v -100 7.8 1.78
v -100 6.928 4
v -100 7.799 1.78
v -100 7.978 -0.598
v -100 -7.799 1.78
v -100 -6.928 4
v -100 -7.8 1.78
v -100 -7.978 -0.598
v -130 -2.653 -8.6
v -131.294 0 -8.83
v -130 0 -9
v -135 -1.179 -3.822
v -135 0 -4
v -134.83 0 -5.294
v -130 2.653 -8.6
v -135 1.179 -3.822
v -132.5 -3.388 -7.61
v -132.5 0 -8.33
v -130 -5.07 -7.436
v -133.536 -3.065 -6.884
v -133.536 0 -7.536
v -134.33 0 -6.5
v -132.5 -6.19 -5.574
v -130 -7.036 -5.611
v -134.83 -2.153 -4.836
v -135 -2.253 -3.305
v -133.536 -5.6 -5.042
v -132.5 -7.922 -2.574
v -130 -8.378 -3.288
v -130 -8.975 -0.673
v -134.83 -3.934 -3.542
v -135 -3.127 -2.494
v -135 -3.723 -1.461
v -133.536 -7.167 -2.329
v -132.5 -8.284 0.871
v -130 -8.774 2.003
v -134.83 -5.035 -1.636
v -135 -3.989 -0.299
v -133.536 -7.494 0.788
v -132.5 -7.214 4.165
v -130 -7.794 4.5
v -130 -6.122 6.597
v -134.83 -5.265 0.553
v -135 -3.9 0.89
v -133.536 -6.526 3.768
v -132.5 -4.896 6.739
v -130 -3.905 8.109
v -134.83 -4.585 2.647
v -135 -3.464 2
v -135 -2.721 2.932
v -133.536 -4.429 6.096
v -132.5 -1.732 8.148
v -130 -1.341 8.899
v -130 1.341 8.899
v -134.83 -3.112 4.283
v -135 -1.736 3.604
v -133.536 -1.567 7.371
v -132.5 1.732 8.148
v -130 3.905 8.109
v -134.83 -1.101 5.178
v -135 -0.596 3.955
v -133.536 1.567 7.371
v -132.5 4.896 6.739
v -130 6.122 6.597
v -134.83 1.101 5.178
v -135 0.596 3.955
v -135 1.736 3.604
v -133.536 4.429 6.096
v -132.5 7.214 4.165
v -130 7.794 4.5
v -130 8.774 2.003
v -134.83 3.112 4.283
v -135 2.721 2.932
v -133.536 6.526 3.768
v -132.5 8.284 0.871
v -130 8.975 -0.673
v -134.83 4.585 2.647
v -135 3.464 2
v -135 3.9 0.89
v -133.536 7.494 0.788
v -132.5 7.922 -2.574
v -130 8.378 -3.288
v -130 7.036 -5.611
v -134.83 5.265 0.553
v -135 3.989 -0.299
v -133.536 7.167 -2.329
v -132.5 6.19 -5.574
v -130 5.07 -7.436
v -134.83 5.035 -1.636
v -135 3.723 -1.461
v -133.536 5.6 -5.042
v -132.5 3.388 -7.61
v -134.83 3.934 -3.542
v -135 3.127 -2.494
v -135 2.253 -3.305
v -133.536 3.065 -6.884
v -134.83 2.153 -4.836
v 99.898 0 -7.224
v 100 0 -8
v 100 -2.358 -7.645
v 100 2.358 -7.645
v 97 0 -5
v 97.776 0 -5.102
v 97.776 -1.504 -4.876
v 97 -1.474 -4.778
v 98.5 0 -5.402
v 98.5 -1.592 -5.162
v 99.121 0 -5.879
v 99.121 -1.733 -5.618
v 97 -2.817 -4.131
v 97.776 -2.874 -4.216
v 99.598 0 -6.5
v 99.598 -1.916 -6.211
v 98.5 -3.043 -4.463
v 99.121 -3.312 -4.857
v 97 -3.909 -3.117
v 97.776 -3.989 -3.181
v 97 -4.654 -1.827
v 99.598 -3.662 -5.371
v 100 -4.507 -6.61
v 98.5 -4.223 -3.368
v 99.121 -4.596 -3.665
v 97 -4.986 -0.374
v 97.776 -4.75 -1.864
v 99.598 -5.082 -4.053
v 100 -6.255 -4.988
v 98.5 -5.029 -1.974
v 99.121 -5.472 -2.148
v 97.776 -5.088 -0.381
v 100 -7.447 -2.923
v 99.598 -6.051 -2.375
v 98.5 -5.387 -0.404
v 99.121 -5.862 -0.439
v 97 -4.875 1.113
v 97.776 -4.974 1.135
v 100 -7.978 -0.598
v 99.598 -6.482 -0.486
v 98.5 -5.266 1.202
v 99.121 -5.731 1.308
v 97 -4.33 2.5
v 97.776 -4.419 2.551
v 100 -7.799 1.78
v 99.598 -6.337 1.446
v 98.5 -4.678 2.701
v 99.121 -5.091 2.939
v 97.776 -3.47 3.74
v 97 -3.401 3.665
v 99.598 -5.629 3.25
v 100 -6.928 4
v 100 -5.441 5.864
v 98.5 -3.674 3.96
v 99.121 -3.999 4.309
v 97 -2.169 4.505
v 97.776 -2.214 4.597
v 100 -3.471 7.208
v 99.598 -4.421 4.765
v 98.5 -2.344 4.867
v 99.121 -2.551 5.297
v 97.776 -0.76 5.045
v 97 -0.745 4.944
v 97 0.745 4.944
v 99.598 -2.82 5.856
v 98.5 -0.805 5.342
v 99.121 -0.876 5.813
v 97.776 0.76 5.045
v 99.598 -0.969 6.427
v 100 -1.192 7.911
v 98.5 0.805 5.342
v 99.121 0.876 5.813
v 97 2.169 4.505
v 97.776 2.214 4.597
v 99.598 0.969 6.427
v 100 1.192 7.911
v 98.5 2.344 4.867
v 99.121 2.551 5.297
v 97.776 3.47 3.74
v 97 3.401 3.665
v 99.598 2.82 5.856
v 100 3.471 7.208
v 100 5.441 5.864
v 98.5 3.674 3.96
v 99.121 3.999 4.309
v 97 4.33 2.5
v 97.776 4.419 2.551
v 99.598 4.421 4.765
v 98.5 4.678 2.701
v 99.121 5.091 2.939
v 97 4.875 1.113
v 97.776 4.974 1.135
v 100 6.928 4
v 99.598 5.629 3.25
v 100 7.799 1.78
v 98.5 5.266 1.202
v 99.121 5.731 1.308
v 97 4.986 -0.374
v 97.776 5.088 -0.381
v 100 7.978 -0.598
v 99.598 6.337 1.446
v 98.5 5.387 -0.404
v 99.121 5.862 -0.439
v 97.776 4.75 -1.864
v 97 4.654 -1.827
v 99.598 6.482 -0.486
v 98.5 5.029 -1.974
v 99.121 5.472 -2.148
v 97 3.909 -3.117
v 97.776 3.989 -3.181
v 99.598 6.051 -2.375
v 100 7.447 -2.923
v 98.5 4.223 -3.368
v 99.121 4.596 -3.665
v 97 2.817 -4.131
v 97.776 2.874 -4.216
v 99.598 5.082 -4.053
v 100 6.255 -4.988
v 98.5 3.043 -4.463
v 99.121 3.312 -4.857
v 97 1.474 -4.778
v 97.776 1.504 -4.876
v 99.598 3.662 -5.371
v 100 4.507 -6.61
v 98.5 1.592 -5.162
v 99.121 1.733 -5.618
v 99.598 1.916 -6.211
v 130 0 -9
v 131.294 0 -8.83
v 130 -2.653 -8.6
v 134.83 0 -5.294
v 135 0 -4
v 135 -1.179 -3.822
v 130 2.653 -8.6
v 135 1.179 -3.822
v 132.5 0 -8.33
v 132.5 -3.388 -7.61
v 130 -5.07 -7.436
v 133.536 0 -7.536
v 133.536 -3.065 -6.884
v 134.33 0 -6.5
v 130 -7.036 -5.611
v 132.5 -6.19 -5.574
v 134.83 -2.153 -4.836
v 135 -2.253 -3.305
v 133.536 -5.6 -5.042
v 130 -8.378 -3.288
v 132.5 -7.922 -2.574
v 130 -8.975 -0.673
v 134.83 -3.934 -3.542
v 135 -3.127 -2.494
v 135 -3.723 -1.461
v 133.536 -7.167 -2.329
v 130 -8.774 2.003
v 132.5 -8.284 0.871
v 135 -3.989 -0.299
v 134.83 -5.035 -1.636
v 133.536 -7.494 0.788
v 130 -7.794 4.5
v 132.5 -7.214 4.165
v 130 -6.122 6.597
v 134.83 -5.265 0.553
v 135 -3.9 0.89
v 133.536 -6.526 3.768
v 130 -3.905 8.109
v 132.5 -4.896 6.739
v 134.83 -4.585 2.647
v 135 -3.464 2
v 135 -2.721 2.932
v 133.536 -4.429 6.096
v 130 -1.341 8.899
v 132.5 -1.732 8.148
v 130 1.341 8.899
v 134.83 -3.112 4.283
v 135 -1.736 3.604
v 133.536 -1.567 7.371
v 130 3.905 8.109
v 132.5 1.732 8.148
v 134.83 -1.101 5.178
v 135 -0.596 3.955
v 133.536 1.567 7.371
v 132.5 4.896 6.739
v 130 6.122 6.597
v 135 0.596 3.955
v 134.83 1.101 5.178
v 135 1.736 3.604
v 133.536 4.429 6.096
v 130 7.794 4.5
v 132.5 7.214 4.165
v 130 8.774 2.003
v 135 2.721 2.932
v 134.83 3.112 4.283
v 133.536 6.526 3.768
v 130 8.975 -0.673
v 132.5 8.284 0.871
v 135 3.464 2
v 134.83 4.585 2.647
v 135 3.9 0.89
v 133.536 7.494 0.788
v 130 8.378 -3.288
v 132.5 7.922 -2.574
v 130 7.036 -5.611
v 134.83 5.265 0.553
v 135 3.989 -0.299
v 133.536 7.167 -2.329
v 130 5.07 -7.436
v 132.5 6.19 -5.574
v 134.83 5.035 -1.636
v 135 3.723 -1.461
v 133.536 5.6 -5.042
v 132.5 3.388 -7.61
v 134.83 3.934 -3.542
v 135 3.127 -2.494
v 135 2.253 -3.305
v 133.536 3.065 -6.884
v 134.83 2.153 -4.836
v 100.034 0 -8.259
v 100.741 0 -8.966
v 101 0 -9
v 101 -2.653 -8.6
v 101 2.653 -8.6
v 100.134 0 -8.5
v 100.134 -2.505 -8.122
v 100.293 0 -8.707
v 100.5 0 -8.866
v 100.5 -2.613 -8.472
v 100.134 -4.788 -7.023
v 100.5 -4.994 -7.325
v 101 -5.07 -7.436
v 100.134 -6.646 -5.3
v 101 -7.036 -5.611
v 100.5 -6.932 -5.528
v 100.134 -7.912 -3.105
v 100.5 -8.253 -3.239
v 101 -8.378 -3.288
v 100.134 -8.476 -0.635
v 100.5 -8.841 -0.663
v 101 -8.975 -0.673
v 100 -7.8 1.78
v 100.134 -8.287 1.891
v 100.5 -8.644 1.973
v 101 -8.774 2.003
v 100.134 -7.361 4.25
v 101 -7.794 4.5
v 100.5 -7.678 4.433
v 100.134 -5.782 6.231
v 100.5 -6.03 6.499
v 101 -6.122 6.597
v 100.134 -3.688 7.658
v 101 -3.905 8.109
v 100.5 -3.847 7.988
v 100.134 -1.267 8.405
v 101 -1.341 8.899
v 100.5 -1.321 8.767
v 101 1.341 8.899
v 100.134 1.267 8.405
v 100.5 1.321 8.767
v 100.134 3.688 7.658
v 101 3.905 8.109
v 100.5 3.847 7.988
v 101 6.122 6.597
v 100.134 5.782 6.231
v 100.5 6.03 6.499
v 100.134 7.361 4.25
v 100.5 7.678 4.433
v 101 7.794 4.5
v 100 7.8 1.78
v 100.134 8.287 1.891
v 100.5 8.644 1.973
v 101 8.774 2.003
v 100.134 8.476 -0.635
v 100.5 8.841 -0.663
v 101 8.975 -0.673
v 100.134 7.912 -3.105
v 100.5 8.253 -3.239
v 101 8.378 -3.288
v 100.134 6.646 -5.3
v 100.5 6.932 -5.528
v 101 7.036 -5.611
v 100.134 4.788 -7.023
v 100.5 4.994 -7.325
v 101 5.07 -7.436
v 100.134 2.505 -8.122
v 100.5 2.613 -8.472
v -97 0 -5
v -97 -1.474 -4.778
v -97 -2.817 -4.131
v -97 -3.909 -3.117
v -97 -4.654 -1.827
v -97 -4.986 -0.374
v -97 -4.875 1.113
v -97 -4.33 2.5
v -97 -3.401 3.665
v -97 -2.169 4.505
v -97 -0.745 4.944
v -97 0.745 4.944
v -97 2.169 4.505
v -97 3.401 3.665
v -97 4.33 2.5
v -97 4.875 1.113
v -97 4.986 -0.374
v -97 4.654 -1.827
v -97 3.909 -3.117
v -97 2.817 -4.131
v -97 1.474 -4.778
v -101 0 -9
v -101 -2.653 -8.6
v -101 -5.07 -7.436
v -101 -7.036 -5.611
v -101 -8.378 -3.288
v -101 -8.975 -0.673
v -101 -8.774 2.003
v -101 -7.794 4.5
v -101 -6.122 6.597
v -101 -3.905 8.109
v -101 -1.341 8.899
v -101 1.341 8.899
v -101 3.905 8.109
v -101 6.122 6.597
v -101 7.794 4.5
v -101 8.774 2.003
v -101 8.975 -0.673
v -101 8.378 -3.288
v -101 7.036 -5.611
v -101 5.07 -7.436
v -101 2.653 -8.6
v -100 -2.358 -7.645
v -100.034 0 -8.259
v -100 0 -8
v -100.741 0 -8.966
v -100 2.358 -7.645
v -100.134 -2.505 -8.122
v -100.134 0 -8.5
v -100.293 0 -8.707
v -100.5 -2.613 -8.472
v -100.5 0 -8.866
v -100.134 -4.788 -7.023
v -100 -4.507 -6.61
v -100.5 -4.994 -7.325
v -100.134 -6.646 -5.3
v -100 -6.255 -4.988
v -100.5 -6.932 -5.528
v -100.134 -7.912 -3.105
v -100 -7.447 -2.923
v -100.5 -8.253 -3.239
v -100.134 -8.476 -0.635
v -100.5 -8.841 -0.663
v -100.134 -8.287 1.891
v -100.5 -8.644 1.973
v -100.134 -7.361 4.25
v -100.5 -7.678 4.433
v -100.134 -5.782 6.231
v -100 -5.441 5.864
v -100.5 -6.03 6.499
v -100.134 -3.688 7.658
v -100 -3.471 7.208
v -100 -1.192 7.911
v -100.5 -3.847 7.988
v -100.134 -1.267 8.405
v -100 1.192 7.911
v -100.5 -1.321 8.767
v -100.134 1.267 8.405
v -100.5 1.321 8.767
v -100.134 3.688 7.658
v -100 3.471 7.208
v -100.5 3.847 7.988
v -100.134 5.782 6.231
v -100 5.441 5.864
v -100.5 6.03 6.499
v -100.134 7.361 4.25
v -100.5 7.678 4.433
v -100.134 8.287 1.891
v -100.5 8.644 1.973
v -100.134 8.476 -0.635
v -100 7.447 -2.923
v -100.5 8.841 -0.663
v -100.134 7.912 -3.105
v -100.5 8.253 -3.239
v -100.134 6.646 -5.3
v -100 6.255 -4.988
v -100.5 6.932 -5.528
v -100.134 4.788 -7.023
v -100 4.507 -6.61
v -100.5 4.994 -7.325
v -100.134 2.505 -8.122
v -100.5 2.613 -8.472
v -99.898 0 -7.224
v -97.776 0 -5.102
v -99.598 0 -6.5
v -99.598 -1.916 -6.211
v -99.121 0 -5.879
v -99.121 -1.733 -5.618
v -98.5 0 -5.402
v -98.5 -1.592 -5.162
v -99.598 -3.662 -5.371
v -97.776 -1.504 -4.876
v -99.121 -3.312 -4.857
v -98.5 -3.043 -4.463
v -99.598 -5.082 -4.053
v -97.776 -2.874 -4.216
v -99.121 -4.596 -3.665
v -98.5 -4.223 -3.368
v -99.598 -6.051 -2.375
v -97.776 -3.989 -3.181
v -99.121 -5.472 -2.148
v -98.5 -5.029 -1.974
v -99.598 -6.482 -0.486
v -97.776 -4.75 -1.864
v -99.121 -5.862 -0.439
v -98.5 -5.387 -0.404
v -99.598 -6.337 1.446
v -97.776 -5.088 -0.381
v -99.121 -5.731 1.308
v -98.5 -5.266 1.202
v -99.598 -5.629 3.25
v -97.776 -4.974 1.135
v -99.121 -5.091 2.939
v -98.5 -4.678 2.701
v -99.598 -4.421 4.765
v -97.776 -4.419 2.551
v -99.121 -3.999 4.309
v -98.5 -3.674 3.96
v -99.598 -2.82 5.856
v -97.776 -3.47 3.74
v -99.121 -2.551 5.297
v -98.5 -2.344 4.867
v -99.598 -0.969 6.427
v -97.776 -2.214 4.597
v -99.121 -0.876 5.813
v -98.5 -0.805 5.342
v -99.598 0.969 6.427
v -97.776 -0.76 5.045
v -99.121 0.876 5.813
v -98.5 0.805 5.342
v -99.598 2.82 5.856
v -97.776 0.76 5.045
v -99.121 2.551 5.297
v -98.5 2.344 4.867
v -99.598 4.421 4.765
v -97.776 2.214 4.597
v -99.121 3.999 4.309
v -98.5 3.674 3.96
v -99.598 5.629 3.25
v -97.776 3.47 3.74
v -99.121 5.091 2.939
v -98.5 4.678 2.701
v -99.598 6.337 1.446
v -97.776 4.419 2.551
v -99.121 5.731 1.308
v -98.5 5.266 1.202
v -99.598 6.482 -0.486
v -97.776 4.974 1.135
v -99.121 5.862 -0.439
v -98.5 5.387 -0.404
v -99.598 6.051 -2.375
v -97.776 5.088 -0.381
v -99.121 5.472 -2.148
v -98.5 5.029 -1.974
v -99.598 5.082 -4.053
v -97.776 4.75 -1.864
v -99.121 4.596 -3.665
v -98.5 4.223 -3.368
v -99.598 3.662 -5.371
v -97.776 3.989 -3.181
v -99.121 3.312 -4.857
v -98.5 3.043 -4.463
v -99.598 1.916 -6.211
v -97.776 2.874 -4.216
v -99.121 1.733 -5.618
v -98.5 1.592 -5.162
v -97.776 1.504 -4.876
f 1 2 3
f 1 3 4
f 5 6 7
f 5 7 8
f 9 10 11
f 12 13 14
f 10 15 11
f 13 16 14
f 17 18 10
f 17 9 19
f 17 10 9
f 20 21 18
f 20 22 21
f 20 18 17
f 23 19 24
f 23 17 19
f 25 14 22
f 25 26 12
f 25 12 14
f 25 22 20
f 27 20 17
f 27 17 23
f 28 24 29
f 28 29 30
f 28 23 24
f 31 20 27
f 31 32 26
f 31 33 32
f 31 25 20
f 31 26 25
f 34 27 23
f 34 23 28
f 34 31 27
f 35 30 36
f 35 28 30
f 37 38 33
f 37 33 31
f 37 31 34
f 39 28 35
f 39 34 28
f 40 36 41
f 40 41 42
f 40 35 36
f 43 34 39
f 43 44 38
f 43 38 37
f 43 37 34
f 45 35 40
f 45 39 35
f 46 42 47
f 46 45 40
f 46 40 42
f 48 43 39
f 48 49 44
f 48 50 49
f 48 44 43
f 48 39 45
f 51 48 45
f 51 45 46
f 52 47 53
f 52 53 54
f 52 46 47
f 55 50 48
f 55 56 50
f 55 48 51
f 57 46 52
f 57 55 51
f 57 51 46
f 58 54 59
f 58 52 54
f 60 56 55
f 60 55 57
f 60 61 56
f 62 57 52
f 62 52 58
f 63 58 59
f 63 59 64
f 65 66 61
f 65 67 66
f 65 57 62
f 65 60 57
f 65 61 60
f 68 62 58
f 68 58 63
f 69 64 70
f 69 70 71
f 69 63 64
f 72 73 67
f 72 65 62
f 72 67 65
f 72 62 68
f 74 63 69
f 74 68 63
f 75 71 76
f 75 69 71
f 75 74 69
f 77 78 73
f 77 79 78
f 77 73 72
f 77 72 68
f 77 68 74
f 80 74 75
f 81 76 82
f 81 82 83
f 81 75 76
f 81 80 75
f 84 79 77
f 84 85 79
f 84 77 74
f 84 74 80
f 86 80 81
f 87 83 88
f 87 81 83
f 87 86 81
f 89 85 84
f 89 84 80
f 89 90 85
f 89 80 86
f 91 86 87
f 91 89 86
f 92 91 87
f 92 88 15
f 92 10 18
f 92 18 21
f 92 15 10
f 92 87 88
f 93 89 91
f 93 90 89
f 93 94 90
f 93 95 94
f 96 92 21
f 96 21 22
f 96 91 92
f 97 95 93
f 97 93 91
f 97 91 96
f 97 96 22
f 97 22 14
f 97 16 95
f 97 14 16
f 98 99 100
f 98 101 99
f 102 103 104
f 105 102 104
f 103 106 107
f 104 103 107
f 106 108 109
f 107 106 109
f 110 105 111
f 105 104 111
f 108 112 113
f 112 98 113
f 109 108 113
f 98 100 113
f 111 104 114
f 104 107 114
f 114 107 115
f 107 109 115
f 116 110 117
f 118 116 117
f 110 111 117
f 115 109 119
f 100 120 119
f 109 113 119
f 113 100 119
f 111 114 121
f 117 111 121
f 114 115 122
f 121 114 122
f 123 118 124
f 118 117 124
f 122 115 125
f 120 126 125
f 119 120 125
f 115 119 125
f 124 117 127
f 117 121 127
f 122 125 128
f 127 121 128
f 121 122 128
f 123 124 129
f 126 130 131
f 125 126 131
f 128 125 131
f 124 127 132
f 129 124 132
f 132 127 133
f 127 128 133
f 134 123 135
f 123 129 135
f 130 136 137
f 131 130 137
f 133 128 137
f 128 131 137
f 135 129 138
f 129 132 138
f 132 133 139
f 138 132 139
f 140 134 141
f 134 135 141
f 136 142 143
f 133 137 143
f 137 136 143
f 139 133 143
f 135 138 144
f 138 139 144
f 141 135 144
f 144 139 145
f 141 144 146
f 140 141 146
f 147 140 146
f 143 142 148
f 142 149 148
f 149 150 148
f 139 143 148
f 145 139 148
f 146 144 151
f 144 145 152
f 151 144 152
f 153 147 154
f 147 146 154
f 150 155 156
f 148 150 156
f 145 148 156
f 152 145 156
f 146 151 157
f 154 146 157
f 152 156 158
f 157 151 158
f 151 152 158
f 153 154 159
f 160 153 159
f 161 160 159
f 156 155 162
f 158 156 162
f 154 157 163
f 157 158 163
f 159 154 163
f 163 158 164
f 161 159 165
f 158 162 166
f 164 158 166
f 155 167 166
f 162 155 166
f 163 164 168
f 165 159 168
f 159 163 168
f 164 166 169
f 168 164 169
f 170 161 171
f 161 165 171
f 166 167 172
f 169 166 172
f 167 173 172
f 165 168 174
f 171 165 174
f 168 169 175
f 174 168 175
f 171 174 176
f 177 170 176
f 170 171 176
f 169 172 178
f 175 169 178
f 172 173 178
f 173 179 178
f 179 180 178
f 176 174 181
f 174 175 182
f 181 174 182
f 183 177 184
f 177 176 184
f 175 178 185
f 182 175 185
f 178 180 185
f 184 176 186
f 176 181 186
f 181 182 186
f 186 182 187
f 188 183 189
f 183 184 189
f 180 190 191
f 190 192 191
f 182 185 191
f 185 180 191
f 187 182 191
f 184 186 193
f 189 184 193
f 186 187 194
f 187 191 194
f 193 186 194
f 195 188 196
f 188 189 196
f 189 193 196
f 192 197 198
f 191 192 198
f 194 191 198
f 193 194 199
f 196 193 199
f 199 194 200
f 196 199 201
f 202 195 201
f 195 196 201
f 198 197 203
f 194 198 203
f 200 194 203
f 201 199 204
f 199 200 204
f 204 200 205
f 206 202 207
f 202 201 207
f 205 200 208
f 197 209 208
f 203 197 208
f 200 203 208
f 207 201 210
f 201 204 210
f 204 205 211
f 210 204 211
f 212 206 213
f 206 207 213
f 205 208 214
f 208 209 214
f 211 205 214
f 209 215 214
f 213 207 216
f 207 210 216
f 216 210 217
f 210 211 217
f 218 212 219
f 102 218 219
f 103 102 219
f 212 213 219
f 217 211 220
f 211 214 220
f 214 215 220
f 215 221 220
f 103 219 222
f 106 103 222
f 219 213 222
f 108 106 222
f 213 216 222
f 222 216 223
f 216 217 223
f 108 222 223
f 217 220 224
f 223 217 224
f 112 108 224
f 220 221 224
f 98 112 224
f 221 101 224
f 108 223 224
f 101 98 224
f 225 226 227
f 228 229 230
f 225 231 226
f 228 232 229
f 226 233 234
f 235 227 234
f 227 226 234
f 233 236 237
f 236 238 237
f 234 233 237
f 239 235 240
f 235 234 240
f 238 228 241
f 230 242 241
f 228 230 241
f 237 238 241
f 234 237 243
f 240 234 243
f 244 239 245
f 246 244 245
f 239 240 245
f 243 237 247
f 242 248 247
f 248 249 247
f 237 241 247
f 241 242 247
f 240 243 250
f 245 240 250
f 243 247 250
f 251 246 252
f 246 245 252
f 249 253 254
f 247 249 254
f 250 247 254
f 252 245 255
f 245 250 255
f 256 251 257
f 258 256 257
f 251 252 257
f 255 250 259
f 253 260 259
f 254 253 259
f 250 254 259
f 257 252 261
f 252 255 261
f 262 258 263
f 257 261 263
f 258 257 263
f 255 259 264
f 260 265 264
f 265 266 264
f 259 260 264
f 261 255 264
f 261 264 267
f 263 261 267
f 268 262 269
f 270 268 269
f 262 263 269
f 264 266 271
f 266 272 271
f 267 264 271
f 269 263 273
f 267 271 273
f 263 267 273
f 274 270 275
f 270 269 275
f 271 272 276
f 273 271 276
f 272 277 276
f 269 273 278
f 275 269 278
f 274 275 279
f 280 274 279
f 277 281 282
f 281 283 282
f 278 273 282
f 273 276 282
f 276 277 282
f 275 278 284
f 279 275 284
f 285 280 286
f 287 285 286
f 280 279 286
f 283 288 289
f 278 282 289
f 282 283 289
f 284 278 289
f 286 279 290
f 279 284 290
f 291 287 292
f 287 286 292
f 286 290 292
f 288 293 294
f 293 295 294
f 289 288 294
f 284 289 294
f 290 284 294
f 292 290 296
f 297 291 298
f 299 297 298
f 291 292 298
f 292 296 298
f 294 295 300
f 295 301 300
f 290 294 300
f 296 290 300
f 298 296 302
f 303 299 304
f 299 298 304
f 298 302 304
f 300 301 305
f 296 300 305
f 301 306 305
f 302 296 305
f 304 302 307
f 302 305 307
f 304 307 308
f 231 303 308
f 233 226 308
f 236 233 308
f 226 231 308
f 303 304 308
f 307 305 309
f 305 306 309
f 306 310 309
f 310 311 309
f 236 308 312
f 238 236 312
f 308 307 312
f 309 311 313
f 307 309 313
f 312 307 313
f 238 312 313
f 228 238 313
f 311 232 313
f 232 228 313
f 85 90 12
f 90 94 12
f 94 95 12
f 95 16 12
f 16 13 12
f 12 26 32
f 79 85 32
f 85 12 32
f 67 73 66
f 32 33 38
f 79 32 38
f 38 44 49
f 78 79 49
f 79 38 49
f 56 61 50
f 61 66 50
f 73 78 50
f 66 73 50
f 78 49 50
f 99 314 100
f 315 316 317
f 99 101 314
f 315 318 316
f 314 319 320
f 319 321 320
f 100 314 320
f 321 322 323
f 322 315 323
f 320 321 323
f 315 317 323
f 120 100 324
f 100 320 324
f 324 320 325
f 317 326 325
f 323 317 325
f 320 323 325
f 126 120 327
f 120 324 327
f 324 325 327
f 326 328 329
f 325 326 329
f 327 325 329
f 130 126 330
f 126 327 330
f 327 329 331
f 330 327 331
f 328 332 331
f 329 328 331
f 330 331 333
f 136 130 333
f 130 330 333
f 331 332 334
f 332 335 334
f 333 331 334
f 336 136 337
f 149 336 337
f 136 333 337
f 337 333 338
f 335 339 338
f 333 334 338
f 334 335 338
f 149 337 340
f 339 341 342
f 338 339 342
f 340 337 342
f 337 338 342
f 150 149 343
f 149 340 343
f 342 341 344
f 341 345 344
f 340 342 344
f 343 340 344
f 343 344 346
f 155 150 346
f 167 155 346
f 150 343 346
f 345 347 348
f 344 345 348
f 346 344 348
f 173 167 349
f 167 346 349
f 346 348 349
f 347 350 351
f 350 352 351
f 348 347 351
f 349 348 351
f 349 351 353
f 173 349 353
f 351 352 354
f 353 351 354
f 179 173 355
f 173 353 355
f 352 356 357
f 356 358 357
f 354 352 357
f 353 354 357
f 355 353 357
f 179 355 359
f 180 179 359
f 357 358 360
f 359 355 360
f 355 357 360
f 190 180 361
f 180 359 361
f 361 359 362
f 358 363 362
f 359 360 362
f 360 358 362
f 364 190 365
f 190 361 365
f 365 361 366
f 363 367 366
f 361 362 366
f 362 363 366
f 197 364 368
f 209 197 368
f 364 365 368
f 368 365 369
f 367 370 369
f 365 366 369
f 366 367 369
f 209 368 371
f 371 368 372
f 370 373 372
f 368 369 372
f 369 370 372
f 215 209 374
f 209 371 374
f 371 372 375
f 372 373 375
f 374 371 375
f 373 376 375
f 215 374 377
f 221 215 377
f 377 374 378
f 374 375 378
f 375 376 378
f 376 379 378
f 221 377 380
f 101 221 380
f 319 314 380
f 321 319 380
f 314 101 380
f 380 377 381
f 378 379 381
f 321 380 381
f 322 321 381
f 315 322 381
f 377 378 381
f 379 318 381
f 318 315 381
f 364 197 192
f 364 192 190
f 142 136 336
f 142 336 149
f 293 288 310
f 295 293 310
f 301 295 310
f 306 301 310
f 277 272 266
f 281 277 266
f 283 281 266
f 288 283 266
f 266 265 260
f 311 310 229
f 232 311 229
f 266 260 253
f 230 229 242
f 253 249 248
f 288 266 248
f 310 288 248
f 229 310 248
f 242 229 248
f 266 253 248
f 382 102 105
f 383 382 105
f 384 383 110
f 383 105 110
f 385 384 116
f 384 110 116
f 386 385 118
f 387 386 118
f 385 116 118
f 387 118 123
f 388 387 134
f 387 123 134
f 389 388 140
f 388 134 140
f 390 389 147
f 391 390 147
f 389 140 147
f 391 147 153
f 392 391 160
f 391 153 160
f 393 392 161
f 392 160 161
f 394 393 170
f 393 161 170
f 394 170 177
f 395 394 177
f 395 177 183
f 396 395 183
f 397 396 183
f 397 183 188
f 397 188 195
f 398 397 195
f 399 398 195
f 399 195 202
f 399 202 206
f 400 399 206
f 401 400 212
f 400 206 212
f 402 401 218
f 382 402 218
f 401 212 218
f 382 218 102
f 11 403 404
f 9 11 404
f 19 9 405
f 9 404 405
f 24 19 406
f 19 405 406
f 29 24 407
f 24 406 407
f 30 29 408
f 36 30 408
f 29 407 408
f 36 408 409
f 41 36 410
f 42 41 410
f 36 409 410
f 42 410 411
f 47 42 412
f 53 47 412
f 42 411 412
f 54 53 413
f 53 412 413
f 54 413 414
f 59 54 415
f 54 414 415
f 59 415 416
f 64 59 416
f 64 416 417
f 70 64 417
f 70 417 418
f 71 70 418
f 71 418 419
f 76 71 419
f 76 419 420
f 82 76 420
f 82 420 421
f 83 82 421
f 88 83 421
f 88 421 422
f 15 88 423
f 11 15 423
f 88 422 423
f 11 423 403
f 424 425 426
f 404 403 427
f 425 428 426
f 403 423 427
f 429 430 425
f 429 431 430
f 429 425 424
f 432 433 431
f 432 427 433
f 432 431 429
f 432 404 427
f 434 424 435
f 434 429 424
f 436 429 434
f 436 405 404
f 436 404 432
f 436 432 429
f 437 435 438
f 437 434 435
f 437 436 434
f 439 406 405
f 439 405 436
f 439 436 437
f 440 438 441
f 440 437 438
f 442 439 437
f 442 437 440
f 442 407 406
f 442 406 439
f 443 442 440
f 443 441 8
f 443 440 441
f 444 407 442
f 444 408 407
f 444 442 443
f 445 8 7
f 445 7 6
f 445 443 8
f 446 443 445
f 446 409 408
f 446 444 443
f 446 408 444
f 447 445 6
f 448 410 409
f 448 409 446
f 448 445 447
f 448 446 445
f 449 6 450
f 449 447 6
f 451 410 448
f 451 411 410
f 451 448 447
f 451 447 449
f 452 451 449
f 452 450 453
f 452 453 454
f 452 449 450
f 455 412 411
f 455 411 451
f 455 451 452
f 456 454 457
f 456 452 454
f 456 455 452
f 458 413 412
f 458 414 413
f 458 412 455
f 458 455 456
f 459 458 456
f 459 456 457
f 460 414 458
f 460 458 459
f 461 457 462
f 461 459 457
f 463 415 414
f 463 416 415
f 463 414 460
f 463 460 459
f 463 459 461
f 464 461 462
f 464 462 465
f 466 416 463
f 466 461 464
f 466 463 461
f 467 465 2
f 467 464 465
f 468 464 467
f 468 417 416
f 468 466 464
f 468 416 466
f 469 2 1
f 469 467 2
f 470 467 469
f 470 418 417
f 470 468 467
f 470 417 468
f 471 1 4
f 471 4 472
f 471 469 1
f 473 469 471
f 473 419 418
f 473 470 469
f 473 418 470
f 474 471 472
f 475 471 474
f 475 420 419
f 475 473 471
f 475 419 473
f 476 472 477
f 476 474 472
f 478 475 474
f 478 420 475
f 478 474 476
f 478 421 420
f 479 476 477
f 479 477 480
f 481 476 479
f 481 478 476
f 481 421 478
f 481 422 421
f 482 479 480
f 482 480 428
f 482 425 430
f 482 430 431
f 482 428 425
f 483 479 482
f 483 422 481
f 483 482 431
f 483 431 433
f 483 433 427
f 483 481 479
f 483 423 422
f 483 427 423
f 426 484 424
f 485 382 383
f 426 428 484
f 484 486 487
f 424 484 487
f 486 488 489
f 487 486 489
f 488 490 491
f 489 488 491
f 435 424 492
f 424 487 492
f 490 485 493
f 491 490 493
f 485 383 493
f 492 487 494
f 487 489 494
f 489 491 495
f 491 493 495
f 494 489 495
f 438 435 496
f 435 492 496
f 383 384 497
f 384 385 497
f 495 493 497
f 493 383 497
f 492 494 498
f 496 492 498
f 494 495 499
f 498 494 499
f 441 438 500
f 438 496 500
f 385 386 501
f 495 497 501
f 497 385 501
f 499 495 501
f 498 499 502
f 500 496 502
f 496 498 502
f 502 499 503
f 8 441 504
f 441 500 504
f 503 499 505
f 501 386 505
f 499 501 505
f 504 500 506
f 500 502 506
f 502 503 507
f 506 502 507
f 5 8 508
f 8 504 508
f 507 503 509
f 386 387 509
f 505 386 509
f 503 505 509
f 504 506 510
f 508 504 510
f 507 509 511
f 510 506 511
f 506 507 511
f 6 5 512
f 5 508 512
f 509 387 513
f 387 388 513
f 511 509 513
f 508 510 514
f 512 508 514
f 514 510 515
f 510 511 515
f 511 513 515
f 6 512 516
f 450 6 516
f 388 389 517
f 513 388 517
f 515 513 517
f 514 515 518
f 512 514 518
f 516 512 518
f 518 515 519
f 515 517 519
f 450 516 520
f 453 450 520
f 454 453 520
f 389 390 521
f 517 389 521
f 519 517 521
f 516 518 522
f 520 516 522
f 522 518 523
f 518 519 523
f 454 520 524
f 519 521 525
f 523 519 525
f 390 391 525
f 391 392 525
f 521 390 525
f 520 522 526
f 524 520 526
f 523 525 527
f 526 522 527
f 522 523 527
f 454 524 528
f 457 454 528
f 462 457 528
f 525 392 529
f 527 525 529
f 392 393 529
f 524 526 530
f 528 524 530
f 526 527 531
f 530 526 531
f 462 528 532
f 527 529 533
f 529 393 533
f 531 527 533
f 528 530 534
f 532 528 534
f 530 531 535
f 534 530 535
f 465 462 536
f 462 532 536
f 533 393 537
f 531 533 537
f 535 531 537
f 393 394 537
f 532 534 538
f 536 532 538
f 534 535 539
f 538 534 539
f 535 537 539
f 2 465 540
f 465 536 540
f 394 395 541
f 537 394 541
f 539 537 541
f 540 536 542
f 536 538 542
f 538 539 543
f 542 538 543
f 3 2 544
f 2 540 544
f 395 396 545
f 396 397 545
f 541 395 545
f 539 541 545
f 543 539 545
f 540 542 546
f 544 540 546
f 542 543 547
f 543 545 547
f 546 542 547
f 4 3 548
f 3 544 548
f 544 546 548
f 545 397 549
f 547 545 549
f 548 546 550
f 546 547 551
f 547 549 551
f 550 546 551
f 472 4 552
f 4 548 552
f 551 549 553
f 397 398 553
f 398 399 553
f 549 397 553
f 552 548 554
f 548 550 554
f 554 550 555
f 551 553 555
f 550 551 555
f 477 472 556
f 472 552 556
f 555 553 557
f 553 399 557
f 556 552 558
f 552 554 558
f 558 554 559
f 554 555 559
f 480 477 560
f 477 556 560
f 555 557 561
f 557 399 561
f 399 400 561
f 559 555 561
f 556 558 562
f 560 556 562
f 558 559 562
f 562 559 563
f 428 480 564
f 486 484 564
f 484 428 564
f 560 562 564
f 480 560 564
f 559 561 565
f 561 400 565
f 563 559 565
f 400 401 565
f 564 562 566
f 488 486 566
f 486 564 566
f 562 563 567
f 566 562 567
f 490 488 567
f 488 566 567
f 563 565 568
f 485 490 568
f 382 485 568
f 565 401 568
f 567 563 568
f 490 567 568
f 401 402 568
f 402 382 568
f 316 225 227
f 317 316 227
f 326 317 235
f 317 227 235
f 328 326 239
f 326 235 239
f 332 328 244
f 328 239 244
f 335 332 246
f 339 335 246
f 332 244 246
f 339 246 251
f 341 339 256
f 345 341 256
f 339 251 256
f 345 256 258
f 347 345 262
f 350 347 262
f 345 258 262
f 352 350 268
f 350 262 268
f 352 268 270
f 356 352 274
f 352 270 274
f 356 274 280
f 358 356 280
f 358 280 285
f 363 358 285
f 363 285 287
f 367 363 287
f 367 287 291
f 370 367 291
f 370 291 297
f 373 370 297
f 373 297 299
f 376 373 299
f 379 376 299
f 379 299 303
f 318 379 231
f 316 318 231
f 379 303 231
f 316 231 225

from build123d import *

# Parameters (mm, degrees)
FILLET1_R = 3
FILLET2_R = 1
FILLET3_R = 5


with BuildPart() as part:
    # Sketch1 → Revolve1 (revolve)
    with BuildSketch(Plane(origin=(0, 0, 0), x_dir=(1, 0, 0), z_dir=(0, 1, 0)), mode=Mode.PRIVATE) as revolve1_sk:
        Polygon((135, 0), (-135, 0), (-135, -9), (-100, -9), (-100, -5), (100, -5), (100, -9), (135, -9), align=None)
    revolve(revolve1_sk.sketch.rotate(Axis((135, 0, 0), (-1, 0, 0)), 180), axis=Axis((135, 0, 0), (-1, 0, 0)))

    # Fillet1
    fillet1_edges = [part.edges().sort_by_distance(p)[0] for p in [
        (100, 0, 5),
        (-100, 0, 5),
    ]]
    fillet(fillet1_edges, radius=FILLET1_R)

    # Fillet2
    fillet2_edges = [part.edges().sort_by_distance(p)[0] for p in [
        (100, 0, 9),
        (-100, 0, 9),
    ]]
    fillet(fillet2_edges, radius=FILLET2_R - 0.0001)  # a hair under: the kernel refuses the full size

    # Fillet3
    fillet3_edges = [part.edges().sort_by_distance(p)[0] for p in [
        (-135, 0, 9),
        (135, 0, 9),
    ]]
    fillet(fillet3_edges, radius=FILLET3_R)


solid = part.part
